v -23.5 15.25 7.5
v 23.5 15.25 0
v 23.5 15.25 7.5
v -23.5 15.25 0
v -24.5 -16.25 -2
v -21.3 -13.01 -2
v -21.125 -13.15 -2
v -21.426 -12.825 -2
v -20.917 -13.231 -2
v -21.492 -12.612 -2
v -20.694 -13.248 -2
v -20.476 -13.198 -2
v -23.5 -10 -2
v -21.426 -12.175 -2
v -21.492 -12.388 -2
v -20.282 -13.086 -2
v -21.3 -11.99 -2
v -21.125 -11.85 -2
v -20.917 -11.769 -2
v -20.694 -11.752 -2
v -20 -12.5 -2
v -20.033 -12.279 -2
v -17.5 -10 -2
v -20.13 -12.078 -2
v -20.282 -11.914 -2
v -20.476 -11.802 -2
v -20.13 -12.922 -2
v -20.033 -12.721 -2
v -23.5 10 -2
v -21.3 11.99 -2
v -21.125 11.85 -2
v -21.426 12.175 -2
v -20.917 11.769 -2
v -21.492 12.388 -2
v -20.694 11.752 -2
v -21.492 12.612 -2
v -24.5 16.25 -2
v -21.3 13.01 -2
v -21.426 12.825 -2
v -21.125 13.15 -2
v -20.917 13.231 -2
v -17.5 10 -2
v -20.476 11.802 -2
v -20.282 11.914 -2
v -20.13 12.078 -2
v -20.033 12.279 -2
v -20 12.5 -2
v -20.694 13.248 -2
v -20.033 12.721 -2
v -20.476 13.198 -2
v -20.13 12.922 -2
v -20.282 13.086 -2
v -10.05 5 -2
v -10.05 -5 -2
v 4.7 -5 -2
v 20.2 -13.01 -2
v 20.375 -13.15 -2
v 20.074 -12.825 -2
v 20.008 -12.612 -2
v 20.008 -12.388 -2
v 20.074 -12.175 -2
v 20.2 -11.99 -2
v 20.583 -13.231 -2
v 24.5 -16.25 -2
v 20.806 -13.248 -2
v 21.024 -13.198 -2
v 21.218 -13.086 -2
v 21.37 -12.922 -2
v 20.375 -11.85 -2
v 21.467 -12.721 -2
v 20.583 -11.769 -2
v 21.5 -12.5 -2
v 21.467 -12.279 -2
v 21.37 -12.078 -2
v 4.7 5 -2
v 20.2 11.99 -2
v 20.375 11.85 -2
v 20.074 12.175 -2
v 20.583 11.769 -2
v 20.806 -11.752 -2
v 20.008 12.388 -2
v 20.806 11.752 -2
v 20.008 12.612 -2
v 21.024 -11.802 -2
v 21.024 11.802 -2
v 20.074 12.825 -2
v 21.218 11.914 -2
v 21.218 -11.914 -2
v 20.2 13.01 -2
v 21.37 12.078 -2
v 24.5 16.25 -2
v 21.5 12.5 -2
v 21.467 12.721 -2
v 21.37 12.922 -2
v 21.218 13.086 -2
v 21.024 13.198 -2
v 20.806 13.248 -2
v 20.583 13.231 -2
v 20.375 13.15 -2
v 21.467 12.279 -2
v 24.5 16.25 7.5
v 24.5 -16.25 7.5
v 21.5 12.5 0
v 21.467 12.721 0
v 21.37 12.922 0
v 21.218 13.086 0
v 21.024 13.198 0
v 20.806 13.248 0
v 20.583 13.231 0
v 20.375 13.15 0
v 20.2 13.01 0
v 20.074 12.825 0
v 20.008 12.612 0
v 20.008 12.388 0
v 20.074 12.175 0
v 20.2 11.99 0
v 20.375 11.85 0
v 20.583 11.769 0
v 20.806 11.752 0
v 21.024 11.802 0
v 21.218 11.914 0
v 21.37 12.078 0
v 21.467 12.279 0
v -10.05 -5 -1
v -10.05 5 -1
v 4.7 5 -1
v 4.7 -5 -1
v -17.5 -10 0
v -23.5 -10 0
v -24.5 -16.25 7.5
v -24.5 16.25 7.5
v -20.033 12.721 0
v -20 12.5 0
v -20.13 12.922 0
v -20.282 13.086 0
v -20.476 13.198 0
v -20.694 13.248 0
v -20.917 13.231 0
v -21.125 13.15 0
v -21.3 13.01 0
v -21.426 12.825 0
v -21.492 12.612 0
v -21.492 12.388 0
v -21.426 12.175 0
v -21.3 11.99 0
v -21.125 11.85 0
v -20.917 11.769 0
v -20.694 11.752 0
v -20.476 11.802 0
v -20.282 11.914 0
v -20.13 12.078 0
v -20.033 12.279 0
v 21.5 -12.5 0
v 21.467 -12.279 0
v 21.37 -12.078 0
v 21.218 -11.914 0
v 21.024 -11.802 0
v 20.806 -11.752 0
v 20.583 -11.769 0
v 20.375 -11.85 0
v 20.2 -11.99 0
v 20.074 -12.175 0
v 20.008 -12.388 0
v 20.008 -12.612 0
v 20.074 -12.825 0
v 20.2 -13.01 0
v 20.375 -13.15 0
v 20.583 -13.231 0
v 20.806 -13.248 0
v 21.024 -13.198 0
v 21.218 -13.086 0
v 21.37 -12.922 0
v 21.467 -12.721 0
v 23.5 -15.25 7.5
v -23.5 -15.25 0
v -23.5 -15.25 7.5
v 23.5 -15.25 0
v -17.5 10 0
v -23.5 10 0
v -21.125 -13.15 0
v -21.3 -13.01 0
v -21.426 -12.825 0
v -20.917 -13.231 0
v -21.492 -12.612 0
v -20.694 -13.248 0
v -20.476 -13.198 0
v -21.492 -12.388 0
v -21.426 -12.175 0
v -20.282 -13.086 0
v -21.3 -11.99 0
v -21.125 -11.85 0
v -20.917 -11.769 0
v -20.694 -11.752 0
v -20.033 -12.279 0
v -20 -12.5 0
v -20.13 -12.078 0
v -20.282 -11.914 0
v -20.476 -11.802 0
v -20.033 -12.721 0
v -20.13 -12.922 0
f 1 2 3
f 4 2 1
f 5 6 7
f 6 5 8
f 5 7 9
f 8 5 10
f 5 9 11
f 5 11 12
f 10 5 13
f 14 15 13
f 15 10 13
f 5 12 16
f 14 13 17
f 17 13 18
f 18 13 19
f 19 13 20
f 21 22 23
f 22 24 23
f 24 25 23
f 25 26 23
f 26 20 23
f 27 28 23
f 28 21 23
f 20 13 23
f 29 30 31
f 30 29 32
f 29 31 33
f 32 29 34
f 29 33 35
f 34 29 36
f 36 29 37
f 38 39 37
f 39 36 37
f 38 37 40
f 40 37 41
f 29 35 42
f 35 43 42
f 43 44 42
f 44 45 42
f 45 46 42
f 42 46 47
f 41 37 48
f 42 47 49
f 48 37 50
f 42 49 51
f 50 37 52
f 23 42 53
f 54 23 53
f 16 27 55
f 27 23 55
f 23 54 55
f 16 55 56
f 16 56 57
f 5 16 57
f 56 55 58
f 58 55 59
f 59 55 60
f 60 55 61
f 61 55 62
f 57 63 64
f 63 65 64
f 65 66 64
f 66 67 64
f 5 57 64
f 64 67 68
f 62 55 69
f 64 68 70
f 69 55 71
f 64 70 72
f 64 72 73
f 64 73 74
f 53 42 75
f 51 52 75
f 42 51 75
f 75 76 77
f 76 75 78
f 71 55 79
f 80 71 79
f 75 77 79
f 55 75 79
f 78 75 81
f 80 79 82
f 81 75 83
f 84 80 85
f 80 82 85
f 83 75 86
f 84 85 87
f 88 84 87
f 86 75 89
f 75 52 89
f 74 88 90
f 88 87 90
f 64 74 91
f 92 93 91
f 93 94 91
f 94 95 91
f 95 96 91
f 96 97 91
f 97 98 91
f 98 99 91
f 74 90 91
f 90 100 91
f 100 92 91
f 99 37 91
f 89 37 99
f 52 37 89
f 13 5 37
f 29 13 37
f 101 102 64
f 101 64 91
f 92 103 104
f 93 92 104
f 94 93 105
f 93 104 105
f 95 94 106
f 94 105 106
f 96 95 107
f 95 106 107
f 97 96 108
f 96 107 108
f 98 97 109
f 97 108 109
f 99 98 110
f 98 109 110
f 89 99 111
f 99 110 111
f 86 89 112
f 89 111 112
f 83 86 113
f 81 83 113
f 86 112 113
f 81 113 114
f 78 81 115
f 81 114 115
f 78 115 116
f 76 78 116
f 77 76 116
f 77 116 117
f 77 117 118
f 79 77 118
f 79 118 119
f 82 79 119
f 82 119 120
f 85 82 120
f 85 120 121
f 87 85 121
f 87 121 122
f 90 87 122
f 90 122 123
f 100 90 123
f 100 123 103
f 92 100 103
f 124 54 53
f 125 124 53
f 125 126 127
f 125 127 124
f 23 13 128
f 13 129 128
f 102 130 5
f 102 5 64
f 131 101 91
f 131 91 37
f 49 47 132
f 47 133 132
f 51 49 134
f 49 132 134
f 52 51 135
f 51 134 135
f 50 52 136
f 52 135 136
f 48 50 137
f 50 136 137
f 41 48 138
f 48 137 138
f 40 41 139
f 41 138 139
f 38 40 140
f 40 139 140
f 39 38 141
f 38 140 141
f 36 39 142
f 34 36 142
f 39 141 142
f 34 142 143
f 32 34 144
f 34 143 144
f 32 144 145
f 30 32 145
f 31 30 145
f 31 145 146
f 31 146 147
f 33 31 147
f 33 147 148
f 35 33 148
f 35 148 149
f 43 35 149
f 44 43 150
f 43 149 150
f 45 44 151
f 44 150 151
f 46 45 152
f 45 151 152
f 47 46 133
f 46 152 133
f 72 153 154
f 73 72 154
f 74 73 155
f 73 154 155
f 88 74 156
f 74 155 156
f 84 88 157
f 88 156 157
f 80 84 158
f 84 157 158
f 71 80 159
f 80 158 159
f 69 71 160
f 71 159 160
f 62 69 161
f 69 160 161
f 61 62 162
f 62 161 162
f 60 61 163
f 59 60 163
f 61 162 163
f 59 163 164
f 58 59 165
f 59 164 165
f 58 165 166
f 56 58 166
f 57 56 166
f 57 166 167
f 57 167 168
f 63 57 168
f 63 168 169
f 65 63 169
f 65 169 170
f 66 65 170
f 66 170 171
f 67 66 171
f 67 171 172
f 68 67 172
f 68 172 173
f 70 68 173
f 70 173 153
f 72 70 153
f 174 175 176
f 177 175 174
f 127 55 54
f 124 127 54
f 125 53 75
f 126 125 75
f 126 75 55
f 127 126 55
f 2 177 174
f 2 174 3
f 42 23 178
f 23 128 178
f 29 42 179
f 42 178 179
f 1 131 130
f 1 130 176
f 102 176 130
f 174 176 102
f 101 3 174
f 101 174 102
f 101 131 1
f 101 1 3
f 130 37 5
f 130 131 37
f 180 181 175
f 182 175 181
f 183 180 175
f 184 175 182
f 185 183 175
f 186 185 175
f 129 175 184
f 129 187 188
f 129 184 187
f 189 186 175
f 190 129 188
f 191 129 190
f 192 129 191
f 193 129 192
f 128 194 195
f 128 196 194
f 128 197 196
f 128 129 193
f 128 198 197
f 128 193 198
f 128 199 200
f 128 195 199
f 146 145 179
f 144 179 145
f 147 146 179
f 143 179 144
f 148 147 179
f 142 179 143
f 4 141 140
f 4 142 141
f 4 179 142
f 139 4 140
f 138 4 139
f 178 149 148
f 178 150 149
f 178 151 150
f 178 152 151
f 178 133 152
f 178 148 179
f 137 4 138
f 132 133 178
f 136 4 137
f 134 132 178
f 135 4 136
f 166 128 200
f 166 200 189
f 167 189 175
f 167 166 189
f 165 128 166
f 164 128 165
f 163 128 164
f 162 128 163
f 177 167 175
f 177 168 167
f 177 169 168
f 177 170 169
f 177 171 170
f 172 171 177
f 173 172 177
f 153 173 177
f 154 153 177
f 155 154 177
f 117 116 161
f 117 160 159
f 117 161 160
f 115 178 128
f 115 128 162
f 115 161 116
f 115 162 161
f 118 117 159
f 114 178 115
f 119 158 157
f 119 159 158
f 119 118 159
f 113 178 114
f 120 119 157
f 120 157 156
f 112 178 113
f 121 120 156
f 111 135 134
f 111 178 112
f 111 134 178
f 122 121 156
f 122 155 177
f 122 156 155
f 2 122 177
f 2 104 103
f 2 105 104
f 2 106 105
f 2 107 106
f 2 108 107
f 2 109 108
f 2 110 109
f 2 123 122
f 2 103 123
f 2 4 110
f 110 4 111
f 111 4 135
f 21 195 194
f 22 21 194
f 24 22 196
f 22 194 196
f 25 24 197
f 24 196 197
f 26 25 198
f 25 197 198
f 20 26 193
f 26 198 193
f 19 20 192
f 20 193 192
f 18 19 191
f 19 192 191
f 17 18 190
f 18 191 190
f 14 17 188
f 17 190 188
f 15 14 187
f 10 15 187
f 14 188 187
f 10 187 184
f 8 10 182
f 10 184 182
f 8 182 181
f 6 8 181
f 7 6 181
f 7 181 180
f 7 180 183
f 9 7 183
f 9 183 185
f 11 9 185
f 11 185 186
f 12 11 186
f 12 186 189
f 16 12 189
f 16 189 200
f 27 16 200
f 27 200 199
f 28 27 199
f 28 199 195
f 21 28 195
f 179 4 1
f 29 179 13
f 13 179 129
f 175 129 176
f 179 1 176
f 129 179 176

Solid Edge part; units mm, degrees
sketch "Sketch1" plane through (0, 0, 0) normal (0, 0, 1) x (1, 0, 0)
  line L0 (-24.5, 16.25) -> (-24.5, -16.25)
  line L1 (-24.5, -16.25) -> (24.5, -16.25)
  line L2 (24.5, -16.25) -> (24.5, 16.25)
  line L3 (24.5, 16.25) -> (-24.5, 16.25)
extrude "Protrusion1" add sketch "Sketch1" against normal blind 2
sketch "Sketch2" plane through (0, 0, 0) normal (0, 0, 1) x (1, 0, 0)
  line L0 (-23.5, 15.25) -> (-23.5, -15.25)
  line L1 (-23.5, -15.25) -> (23.5, -15.25)
  line L2 (23.5, -15.25) -> (23.5, 15.25)
  line L3 (23.5, 15.25) -> (-23.5, 15.25)
  line L4 (-24.5, 16.25) -> (-24.5, -16.25)
  line L5 (-24.5, -16.25) -> (24.5, -16.25)
  line L6 (24.5, -16.25) -> (24.5, 16.25)
  line L7 (24.5, 16.25) -> (-24.5, 16.25)
  dimension "D1" = 30.5
  dimension "D2" = 47
  dimension "D3" = 1
  dimension "D4" = 1.5
  dimension "D5" = 25
  dimension "D6" = 41.5
  dimension "D7" = 1
  dimension "D8" = 1
  dimension "D9" = 1
  dimension "D10" = 1
  dimension "D11" = 20
  dimension "D12" = 6
extrude "ExtrudedProtrusion_2" add sketch "Sketch2" along normal blind 7.5
sketch "Sketch3" plane through (0, 0, 0) normal (0, 0, 1) x (1, 0, 0)
  line L0 (-17.5, -10) -> (-17.5, 10)
  line L1 (-17.5, 10) -> (-23.5, 10)
  line L2 (-23.5, 10) -> (-23.5, -10)
  line L3 (-23.5, -10) -> (-17.5, -10)
extrude "Cutout1" cut sketch "Sketch3" against normal up to vertex (2 mm away)
sketch "Sketch4" plane through (0, 0, 0) normal (0, 0, 1) x (1, 0, 0)
  circle A0 centre (-20.75, 12.5) radius 0.75
  circle A1 centre (-20.75, -12.5) radius 0.75
  circle A2 centre (20.75, -12.5) radius 0.75
  circle A3 centre (20.75, 12.5) radius 0.75
  dimension "D1" = 30.5
  dimension "D2" = 47
  dimension "D3" = 1
  dimension "D4" = 1.5
  dimension "D5" = 25
  dimension "D6" = 41.5
  dimension "D7" = 1
  dimension "D8" = 1
  dimension "D9" = 1
  dimension "D10" = 1
  dimension "D11" = 20
  dimension "D12" = 6
extrude "Cutout2" cut sketch "Sketch4" against normal up to vertex (2 mm away)
sketch "Sketch5" plane through (0, 0, -2) normal (0, 0, -1) x (1, 0, 0)
  line L0 (-10.05, 5.5) -> (-10.05, -4.5)
  line L1 (-10.05, -4.5) -> (4.7, -4.5)
  line L2 (4.7, -4.5) -> (4.7, 5.5)
  line L3 (4.7, 5.5) -> (-10.05, 5.5)
extrude "ExtrudedCutout_4" cut sketch "Sketch5" against normal blind 1
sketch "Sketch6" plane through (0, 0, -2) normal (0, 0, -1) x (1, 0, 0)
  line L0 (4.7, 5.5) -> (-10.05, 5.5)
  line L1 (-10.05, 5.5) -> (-10.05, -4.5)
  line L2 (-10.05, -4.5) -> (4.7, -4.5)
  line L3 (4.7, -4.5) -> (4.7, 5.5)
extrude "Protrusion2" add sketch "Sketch6" against normal up to vertex (1 mm away)
sketch "Sketch7" plane through (0, 0, -2) normal (0, 0, -1) x (1, 0, 0)
  line L0 (-10.05, -5) -> (4.7, -5)
  line L1 (4.7, -5) -> (4.7, 5)
  line L2 (4.7, 5) -> (-10.05, 5)
  line L3 (-10.05, 5) -> (-10.05, -5)
extrude "ExtrudedCutout_5" cut sketch "Sketch7" against normal blind 1
properties material "Graphite"
